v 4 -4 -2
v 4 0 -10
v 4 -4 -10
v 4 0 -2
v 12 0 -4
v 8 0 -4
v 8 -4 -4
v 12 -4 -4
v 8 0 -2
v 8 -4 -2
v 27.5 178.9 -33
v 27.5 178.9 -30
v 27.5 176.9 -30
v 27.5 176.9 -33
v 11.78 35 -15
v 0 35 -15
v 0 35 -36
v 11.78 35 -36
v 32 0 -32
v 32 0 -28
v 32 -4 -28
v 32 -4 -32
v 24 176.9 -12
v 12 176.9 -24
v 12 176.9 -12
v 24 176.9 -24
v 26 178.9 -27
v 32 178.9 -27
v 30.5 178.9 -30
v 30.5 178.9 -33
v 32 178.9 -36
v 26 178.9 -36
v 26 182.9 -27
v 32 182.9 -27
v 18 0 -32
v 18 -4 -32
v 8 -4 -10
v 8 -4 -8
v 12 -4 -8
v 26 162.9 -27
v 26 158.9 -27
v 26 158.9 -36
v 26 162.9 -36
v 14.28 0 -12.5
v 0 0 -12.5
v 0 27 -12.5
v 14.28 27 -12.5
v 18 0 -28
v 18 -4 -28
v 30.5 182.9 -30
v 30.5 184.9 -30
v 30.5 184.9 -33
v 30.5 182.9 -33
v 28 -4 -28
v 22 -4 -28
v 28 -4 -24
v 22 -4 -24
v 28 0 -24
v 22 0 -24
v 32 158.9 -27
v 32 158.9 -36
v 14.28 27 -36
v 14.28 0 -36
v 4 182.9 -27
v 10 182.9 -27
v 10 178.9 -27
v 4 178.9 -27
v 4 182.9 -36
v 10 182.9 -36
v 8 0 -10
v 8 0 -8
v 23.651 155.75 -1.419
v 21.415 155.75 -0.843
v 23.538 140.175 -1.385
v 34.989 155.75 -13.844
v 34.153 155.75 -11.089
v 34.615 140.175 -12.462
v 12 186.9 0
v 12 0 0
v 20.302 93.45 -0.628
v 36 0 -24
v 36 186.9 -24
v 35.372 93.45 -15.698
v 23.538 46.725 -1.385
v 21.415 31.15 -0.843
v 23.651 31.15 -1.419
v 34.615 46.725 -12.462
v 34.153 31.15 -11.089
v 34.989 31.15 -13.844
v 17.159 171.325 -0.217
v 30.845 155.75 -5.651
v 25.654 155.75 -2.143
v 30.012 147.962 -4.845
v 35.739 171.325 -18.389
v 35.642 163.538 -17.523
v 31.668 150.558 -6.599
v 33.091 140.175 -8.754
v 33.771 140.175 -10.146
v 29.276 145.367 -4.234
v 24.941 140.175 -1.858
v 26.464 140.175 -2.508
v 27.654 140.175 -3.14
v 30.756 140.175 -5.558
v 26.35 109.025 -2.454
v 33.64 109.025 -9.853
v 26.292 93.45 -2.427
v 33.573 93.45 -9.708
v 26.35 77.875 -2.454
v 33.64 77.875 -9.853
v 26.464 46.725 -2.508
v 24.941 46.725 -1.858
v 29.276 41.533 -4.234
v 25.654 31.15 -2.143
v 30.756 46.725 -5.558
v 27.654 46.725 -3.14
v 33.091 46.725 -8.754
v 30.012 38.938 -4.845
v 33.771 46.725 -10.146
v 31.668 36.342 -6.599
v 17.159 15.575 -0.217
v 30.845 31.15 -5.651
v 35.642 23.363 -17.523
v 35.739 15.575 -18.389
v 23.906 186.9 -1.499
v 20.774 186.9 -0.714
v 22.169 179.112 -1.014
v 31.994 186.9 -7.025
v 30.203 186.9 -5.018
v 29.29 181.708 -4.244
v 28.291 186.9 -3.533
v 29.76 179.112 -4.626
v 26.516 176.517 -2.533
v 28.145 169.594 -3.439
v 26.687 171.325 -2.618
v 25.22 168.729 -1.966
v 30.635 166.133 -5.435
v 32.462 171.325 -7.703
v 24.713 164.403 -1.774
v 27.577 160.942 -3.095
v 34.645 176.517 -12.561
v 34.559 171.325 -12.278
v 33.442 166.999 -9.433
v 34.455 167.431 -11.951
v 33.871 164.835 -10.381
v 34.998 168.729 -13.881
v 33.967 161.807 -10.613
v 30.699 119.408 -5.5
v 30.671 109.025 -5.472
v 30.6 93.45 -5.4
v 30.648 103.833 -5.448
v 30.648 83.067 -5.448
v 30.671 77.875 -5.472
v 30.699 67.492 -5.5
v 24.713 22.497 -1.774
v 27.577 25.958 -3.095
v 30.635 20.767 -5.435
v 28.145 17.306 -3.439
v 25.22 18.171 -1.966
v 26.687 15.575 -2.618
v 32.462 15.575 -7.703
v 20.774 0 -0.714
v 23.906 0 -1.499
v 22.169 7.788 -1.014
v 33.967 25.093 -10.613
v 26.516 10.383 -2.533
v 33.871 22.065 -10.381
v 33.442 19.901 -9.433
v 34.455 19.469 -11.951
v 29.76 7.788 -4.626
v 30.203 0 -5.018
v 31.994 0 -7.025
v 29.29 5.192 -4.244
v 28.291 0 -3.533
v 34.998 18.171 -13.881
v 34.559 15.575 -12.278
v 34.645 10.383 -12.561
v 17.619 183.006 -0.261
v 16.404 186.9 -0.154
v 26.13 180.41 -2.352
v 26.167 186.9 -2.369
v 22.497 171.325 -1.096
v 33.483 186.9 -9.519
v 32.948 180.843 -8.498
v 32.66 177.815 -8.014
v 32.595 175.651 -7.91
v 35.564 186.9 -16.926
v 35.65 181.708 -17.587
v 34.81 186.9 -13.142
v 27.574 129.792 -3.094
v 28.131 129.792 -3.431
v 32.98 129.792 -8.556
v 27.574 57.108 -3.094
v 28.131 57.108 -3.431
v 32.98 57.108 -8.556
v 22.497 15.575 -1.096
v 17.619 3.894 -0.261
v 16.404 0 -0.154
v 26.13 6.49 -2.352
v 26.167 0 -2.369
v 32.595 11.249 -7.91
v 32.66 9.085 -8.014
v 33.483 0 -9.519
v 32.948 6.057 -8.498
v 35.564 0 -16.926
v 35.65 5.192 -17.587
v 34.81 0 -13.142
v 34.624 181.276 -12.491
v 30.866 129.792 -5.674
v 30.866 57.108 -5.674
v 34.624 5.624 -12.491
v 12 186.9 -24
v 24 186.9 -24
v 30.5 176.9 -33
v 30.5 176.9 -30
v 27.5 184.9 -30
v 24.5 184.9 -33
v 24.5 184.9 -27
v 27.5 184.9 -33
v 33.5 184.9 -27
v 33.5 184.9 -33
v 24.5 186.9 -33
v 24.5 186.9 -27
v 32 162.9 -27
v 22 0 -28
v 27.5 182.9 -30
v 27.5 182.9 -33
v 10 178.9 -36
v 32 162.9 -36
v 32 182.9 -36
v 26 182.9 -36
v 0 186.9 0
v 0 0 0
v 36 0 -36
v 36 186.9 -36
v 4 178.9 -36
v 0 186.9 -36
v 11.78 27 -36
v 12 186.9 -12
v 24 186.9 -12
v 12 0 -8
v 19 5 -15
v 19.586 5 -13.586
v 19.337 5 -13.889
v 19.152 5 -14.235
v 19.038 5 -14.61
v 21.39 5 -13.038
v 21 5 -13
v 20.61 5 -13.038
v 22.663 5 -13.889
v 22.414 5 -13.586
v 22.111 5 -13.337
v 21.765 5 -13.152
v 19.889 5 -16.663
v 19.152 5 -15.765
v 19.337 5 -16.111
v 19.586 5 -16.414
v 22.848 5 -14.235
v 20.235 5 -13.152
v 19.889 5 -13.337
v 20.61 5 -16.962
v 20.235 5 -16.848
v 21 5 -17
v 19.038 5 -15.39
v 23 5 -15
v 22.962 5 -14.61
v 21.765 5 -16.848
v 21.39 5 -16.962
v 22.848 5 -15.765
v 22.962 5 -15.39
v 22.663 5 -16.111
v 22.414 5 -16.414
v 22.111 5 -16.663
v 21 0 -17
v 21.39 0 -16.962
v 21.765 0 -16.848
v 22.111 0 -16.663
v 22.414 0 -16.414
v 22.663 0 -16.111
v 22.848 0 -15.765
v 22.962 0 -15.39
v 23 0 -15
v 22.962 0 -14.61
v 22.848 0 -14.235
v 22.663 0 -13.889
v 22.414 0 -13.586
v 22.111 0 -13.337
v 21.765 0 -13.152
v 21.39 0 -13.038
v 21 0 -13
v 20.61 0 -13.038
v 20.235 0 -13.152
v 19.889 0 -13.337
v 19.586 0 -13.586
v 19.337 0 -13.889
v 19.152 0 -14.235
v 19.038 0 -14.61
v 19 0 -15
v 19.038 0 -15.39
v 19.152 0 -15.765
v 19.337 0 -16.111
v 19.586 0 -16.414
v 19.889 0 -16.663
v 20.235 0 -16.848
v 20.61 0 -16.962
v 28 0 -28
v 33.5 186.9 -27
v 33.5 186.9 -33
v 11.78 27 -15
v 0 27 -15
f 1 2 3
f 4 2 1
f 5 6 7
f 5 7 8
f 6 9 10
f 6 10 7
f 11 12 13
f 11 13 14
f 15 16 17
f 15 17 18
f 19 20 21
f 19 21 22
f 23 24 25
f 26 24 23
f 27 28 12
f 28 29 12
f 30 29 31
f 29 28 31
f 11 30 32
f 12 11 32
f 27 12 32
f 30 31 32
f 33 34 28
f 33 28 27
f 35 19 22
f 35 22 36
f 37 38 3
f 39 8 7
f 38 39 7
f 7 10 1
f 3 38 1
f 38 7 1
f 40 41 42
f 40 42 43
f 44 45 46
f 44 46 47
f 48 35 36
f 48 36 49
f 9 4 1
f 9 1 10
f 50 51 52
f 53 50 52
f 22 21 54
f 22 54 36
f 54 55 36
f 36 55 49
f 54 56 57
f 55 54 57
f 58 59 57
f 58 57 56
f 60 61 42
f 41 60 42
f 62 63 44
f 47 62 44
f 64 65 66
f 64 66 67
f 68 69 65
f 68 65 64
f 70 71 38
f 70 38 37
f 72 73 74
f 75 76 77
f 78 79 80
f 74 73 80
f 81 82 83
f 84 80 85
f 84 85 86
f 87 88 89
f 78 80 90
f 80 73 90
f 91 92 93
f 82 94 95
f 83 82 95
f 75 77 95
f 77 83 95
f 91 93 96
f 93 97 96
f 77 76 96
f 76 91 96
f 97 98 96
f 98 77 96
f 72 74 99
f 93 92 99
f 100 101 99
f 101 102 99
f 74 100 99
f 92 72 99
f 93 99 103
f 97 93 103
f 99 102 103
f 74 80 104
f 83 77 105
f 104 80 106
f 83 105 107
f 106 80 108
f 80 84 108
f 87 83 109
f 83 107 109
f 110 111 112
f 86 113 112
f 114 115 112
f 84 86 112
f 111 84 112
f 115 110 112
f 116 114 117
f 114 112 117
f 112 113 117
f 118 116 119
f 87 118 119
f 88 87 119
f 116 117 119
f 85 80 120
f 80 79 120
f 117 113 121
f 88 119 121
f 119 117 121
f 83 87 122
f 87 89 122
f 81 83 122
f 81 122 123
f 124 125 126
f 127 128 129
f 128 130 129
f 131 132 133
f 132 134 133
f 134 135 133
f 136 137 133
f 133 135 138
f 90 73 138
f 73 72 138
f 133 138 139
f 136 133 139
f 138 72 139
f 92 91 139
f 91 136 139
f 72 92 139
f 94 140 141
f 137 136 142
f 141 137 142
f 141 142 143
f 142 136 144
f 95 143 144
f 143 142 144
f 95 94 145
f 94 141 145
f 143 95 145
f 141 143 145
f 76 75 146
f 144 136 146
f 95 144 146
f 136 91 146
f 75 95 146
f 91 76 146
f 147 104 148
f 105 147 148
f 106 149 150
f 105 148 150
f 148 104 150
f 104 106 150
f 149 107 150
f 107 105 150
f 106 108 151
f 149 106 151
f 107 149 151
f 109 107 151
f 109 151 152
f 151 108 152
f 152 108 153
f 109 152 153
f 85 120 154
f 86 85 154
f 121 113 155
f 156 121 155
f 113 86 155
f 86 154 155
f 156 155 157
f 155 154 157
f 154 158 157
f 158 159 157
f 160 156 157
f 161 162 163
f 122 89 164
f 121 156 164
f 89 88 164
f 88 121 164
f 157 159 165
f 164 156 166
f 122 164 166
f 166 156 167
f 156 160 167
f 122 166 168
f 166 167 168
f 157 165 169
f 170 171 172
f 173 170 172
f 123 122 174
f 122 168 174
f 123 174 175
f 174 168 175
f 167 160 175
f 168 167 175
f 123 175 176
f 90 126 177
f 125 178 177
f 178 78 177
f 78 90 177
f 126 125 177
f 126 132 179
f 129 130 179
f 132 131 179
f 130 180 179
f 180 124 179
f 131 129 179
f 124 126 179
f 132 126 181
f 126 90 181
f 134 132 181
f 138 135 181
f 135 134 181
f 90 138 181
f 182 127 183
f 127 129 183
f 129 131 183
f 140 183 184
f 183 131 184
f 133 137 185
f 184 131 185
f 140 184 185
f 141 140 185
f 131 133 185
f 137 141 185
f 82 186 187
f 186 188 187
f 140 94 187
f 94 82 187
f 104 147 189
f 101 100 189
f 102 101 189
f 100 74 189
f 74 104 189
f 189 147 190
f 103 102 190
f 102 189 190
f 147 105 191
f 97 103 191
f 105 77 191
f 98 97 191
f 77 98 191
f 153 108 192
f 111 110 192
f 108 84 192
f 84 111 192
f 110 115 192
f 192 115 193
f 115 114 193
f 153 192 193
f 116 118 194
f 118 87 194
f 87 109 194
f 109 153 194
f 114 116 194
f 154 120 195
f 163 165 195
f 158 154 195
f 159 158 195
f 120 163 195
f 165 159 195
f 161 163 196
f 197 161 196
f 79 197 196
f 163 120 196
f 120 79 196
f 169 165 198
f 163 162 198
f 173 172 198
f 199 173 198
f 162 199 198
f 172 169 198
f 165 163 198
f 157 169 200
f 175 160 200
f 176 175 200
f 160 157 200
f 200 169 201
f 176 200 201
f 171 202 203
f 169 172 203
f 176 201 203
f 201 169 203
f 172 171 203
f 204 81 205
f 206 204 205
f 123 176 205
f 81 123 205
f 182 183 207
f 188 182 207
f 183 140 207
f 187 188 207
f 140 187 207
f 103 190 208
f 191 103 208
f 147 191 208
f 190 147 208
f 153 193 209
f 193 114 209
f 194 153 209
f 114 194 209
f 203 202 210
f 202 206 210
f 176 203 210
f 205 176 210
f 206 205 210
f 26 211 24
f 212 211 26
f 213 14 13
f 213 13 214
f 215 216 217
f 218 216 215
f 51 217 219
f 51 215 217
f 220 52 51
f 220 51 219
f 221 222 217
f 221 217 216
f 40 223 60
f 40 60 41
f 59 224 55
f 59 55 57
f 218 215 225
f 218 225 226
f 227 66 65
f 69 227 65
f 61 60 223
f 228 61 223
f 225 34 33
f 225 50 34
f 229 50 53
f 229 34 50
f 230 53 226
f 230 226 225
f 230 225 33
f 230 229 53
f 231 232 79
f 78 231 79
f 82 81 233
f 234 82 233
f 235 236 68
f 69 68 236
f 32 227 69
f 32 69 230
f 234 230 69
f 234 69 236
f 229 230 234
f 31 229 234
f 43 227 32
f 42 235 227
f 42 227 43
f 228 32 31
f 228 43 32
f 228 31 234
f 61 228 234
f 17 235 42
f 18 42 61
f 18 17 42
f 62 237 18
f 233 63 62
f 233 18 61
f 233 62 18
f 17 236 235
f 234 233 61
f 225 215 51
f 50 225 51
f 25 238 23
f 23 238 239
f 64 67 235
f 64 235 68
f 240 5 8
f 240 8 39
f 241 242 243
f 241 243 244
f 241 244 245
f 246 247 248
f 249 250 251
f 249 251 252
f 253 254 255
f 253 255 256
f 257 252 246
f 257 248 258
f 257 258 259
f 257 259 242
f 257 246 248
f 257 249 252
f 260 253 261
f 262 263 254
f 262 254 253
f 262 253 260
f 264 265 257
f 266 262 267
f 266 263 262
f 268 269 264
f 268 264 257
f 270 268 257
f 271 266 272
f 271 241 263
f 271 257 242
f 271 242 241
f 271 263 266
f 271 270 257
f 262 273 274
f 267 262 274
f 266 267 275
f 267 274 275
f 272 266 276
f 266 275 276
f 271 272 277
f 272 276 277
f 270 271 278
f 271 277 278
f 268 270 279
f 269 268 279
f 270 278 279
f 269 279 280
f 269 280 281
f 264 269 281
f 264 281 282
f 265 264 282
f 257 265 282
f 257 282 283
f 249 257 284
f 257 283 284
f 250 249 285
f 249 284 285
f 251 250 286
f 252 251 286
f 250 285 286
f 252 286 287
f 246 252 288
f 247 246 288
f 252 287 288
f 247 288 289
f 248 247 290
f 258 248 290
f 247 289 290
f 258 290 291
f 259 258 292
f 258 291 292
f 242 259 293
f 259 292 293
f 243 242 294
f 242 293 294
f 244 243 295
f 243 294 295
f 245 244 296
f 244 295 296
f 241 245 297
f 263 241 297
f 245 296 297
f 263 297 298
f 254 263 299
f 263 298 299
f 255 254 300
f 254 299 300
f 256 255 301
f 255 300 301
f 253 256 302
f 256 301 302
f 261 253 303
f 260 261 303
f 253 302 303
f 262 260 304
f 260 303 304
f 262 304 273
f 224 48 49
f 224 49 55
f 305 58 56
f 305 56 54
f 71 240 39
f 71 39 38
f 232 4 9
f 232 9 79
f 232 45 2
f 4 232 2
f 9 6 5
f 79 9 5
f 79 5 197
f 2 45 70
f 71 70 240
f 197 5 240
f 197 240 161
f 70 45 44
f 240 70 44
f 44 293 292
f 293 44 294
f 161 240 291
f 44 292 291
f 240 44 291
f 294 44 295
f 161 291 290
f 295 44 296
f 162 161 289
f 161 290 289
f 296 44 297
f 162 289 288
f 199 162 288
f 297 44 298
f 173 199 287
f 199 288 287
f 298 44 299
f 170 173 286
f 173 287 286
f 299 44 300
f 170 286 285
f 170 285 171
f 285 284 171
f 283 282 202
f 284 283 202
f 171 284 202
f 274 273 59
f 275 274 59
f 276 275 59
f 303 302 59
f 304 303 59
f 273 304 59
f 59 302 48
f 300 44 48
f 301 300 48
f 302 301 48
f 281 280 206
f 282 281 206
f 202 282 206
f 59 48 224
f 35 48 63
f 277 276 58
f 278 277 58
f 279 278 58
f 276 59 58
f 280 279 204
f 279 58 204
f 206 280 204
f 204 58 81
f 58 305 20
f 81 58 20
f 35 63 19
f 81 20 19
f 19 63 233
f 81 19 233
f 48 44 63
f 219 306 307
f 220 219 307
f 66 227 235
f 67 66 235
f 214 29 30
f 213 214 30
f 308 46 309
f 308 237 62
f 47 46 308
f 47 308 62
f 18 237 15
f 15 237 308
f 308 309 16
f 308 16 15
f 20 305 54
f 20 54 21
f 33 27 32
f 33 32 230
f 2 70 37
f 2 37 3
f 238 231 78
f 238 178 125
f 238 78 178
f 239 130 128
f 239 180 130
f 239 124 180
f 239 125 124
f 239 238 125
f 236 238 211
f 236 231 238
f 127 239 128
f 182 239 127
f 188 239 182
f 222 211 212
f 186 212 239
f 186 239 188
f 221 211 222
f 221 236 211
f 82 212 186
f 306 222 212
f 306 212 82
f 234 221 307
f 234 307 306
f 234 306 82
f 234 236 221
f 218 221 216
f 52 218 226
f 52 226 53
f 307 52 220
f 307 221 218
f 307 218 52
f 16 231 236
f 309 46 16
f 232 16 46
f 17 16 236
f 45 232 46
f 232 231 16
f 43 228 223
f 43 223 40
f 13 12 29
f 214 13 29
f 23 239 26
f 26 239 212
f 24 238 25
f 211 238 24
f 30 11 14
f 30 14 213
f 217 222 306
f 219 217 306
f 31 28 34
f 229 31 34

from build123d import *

# Parameters (mm, degrees)
SKETCH1_W           = 36
SKETCH1_H           = 36
BOSS_EXTRUDE1_DEPTH = 186.9
FILLET1_SIZE        = 24
SKETCH2_W           = 14.28
SKETCH2_H           = 23.5
CUT_EXTRUDE1_DEPTH  = 27
SKETCH3_W           = 11.78
SKETCH3_H           = 21
CUT_EXTRUDE2_DEPTH  = 8
SKETCH4_R           = 2
CUT_EXTRUDE3_DEPTH  = 5
BOSS_EXTRUDE2_DEPTH = 4
SKETCH6_W           = 6
SKETCH6_H           = 4
CUT_EXTRUDE4_DEPTH  = 9
SKETCH7_W           = 3
SKETCH7_H           = 3
SKETCH7_W_2         = 12
SKETCH7_H_2         = 12
CUT_EXTRUDE5_DEPTH  = 10
SKETCH8_W           = 9
SKETCH8_H           = 6
CUT_EXTRUDE6_DEPTH  = 2


with BuildPart() as part:
    # Sketch1 → Boss-Extrude1 (new body)
    with BuildSketch(Plane(origin=(0, 0, 0), x_dir=(1, 0, 0), z_dir=(0, 1, 0))):
        with Locations((18, 18)):
            Rectangle(SKETCH1_W, SKETCH1_H)
    extrude(amount=BOSS_EXTRUDE1_DEPTH)

    # Fillet1
    # a fillet whose section is not a circle: 24 mm, written as the material it takes off along each edge
    with BuildSketch(Plane(origin=(36, -60, 0), x_dir=(-1, 0, 0), z_dir=(0, 1, 0))) as fillet1_piece_1:
        with BuildLine():
            Bezier((FILLET1_SIZE, 0), (0, 0), (0, -FILLET1_SIZE), weights=[1, 1.222222222, 1])
            Line((0, -FILLET1_SIZE), (0, 0))
            Line((0, 0), (FILLET1_SIZE, 0))
        make_face()
    extrude(amount=306.9, mode=Mode.SUBTRACT)

    # Sketch2 → Cut-Extrude1 (cut)
    with BuildSketch(Plane.XZ):
        with Locations((7.14, -24.25)):
            Rectangle(SKETCH2_W, SKETCH2_H)
    extrude(amount=-CUT_EXTRUDE1_DEPTH, mode=Mode.SUBTRACT)

    # Sketch3 → Cut-Extrude2 (cut)
    with BuildSketch(Plane.XZ.offset(-27)):
        with Locations((5.89, -25.5)):
            Rectangle(SKETCH3_W, SKETCH3_H)
    extrude(amount=-CUT_EXTRUDE2_DEPTH, mode=Mode.SUBTRACT)

    # Sketch4 → Cut-Extrude3 (cut)
    with BuildSketch(Plane.XZ):
        with Locations(Location((21, -15, 0), (0, 0, 270))):
            Circle(SKETCH4_R)
    extrude(amount=-CUT_EXTRUDE3_DEPTH, mode=Mode.SUBTRACT)

    # Sketch5 → Boss-Extrude2 (add)
    with BuildSketch(Plane.XZ):
        Polygon((18, -28), (22, -28), (22, -24), (28, -24), (28, -28), (32, -28), (32, -32), (18, -32), align=None)
        Polygon((4, -2), (8, -2), (8, -4), (12, -4), (12, -8), (8, -8), (8, -10), (4, -10), align=None)
    extrude(amount=BOSS_EXTRUDE2_DEPTH)

    # Sketch6 → Cut-Extrude4 (cut)
    with BuildSketch(Plane(origin=(0, 0, -36), x_dir=(-1, 0, 0), z_dir=(0, 0, -1))):
        with Locations((-29, 180.9)):
            Rectangle(SKETCH6_W, SKETCH6_H)
        with Locations((-7, 180.9)):
            Rectangle(SKETCH6_W, SKETCH6_H)
        with Locations((-29, 160.9)):
            Rectangle(SKETCH6_W, SKETCH6_H)
    extrude(amount=-CUT_EXTRUDE4_DEPTH, mode=Mode.SUBTRACT)

    # Sketch7 → Cut-Extrude5 (cut)
    with BuildSketch(Plane(origin=(0, 186.9, 0), x_dir=(1, 0, 0), z_dir=(0, 1, 0))):
        with Locations((29, 31.5)):
            Rectangle(SKETCH7_W, SKETCH7_H)
        with Locations((18, 18)):
            Rectangle(SKETCH7_W_2, SKETCH7_H_2)
    extrude(amount=-CUT_EXTRUDE5_DEPTH, mode=Mode.SUBTRACT)

    # Sketch8 → Cut-Extrude6 (cut)
    with BuildSketch(Plane(origin=(0, 186.9, 0), x_dir=(1, 0, 0), z_dir=(0, 1, 0))):
        with Locations((29, 30)):
            Rectangle(SKETCH8_W, SKETCH8_H)
    extrude(amount=-CUT_EXTRUDE6_DEPTH, mode=Mode.SUBTRACT)


solid = part.part
